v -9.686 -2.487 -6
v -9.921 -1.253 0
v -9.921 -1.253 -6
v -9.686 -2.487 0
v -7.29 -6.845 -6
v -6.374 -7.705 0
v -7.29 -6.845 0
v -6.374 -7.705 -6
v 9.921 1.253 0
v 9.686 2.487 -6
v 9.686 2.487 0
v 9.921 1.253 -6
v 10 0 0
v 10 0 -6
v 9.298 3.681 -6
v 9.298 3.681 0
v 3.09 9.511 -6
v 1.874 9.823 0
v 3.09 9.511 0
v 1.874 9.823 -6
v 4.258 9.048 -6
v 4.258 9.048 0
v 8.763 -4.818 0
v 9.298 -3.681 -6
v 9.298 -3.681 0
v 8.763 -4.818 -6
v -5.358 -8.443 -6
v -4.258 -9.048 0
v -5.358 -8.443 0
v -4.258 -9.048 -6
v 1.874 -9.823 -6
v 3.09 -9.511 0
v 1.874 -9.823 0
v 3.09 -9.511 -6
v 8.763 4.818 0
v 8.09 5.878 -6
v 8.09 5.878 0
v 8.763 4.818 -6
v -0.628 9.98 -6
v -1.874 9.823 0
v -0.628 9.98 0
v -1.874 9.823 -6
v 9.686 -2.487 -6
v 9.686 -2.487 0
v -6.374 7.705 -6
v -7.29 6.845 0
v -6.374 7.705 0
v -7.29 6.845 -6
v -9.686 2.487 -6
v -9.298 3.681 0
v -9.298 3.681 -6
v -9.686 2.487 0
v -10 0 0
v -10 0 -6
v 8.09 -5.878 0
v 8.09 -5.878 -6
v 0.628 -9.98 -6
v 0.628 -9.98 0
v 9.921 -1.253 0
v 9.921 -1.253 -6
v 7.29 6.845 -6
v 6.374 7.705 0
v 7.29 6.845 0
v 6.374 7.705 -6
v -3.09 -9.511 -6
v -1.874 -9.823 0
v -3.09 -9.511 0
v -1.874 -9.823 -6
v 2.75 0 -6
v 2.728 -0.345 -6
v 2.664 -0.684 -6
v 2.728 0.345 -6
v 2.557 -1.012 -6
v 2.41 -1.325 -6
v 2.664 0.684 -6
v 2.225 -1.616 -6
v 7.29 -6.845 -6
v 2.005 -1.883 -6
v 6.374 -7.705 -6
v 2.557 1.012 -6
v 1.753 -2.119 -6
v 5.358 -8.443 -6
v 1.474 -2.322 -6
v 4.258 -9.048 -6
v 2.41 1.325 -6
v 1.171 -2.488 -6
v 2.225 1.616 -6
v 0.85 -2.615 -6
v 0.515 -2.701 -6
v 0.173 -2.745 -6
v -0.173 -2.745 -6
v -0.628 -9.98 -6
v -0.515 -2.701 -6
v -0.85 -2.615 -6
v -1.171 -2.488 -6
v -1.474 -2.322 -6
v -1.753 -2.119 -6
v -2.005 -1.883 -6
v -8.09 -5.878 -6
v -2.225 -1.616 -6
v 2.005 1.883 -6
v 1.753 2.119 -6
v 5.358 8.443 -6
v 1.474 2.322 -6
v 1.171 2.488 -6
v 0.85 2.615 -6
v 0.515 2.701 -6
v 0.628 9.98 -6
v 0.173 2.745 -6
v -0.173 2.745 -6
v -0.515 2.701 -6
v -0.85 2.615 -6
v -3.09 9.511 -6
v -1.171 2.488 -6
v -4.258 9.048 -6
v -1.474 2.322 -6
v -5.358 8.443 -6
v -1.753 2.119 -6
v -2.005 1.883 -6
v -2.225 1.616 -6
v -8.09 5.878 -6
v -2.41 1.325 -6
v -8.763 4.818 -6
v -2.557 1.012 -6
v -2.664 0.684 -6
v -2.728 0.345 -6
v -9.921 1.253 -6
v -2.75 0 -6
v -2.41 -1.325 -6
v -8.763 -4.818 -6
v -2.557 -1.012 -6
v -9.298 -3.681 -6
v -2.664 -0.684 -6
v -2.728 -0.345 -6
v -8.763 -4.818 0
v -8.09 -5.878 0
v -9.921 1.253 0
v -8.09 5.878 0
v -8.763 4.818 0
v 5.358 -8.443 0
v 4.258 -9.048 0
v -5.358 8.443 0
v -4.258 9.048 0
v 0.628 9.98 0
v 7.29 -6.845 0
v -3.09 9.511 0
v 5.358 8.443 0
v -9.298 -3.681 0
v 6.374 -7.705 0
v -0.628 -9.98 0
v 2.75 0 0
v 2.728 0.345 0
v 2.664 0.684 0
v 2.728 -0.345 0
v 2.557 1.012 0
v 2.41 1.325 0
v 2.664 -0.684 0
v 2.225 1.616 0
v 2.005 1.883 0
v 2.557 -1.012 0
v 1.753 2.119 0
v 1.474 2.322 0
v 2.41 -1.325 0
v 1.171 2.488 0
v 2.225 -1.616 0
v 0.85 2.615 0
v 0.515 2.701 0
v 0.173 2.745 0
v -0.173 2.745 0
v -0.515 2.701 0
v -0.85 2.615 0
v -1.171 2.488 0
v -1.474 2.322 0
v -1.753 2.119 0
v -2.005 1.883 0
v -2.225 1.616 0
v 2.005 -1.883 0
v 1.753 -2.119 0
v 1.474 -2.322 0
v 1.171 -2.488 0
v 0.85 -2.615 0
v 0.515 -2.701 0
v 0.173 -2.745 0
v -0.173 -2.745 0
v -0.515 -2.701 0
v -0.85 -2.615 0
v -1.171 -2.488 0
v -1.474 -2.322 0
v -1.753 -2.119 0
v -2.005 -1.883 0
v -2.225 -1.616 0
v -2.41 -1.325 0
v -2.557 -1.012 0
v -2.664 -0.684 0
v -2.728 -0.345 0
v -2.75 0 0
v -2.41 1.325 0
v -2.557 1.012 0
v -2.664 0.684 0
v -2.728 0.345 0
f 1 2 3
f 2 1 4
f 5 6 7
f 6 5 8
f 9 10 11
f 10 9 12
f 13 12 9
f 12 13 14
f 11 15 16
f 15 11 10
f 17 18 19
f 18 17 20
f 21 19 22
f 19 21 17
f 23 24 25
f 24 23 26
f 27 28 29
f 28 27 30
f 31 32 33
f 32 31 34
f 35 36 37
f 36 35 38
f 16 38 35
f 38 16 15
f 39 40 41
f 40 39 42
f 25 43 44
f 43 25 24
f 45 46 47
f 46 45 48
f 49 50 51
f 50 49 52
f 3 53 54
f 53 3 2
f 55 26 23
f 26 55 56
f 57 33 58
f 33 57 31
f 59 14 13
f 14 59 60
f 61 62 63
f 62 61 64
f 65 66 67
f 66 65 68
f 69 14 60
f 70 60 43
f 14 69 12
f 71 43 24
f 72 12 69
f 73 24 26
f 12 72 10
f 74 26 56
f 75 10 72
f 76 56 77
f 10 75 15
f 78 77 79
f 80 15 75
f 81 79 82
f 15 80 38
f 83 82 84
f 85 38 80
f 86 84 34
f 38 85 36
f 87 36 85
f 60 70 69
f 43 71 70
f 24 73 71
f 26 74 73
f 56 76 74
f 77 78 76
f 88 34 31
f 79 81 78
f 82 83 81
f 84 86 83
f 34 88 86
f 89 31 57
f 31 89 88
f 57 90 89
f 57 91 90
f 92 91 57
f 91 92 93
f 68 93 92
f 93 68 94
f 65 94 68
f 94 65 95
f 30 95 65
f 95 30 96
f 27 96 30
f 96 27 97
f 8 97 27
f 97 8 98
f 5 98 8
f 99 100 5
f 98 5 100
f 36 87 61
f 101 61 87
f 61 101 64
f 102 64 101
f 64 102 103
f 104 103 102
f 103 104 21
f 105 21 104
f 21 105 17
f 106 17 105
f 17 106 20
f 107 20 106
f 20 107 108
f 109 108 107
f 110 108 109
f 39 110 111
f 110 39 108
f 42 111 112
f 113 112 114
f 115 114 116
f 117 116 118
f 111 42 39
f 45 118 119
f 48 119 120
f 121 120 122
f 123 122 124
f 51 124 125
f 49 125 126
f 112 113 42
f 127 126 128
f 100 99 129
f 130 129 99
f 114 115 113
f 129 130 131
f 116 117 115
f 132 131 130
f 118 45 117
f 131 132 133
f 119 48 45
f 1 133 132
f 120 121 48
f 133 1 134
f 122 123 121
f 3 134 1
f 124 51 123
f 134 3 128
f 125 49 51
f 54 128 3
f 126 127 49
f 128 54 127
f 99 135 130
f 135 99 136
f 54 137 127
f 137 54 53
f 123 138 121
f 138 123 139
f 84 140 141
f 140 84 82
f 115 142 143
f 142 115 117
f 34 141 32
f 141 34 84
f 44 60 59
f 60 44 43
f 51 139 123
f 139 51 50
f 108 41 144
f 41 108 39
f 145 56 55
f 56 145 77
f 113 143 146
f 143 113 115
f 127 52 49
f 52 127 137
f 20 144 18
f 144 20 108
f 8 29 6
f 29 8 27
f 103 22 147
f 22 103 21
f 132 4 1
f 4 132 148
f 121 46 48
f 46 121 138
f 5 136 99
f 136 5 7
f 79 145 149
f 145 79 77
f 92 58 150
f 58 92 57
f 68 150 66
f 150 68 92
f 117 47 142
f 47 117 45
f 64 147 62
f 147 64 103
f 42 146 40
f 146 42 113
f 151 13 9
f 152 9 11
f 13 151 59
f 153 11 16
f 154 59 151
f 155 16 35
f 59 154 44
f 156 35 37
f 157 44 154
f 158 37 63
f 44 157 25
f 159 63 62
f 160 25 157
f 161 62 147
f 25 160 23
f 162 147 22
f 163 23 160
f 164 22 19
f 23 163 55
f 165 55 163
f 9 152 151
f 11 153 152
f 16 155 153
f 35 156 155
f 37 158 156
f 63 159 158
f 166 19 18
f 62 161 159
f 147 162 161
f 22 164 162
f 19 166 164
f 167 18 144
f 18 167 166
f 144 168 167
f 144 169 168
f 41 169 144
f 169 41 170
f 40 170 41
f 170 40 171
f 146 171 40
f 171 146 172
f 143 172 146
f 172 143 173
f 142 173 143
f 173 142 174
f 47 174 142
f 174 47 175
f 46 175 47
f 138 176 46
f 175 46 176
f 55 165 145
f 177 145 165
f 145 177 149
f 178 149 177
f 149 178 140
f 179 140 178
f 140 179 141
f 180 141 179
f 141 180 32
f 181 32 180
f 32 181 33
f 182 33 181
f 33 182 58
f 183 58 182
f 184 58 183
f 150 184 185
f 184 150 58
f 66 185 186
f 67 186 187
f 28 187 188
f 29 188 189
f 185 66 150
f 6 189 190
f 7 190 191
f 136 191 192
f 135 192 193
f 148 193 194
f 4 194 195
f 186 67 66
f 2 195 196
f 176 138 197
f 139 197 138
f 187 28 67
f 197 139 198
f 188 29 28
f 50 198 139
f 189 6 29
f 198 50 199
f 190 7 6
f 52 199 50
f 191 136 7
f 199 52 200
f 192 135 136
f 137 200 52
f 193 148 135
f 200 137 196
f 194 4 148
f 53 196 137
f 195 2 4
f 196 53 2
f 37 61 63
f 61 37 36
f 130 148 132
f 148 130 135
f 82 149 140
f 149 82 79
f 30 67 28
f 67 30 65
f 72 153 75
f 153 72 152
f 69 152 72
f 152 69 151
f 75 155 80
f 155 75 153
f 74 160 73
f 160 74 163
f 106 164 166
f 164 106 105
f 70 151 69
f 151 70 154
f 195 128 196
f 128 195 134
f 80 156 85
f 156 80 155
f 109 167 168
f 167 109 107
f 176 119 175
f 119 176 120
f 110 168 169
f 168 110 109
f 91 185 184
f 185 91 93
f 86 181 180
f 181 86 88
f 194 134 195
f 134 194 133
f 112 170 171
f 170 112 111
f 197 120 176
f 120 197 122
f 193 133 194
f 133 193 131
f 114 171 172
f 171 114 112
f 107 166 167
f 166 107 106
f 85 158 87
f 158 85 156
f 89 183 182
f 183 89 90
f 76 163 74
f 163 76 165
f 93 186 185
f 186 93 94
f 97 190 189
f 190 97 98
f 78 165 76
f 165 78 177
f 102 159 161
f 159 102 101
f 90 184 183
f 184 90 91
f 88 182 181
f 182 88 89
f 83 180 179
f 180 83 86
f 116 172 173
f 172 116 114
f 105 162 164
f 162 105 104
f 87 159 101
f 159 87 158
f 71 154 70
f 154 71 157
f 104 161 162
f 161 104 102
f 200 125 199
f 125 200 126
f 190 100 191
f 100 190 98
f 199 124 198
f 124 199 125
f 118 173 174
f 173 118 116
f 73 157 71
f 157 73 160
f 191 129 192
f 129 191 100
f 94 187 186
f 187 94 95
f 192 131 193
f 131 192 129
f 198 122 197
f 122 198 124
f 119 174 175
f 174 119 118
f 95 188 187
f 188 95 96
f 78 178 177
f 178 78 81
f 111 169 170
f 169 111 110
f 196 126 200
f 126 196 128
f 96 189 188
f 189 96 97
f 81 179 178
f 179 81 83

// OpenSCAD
$fn = 50;


difference() {
	union() {
		translate(v = [0, 0, -6.0000000000]) {
			cylinder(h = 6, r = 10.0000000000);
		}
		cylinder(h = 0, r = 20.0000000000);
	}
	union() {
		#translate(v = [0, 0, -6]) {
			cylinder(h = 6, r = 2.7500000000);
		}
	}
}
